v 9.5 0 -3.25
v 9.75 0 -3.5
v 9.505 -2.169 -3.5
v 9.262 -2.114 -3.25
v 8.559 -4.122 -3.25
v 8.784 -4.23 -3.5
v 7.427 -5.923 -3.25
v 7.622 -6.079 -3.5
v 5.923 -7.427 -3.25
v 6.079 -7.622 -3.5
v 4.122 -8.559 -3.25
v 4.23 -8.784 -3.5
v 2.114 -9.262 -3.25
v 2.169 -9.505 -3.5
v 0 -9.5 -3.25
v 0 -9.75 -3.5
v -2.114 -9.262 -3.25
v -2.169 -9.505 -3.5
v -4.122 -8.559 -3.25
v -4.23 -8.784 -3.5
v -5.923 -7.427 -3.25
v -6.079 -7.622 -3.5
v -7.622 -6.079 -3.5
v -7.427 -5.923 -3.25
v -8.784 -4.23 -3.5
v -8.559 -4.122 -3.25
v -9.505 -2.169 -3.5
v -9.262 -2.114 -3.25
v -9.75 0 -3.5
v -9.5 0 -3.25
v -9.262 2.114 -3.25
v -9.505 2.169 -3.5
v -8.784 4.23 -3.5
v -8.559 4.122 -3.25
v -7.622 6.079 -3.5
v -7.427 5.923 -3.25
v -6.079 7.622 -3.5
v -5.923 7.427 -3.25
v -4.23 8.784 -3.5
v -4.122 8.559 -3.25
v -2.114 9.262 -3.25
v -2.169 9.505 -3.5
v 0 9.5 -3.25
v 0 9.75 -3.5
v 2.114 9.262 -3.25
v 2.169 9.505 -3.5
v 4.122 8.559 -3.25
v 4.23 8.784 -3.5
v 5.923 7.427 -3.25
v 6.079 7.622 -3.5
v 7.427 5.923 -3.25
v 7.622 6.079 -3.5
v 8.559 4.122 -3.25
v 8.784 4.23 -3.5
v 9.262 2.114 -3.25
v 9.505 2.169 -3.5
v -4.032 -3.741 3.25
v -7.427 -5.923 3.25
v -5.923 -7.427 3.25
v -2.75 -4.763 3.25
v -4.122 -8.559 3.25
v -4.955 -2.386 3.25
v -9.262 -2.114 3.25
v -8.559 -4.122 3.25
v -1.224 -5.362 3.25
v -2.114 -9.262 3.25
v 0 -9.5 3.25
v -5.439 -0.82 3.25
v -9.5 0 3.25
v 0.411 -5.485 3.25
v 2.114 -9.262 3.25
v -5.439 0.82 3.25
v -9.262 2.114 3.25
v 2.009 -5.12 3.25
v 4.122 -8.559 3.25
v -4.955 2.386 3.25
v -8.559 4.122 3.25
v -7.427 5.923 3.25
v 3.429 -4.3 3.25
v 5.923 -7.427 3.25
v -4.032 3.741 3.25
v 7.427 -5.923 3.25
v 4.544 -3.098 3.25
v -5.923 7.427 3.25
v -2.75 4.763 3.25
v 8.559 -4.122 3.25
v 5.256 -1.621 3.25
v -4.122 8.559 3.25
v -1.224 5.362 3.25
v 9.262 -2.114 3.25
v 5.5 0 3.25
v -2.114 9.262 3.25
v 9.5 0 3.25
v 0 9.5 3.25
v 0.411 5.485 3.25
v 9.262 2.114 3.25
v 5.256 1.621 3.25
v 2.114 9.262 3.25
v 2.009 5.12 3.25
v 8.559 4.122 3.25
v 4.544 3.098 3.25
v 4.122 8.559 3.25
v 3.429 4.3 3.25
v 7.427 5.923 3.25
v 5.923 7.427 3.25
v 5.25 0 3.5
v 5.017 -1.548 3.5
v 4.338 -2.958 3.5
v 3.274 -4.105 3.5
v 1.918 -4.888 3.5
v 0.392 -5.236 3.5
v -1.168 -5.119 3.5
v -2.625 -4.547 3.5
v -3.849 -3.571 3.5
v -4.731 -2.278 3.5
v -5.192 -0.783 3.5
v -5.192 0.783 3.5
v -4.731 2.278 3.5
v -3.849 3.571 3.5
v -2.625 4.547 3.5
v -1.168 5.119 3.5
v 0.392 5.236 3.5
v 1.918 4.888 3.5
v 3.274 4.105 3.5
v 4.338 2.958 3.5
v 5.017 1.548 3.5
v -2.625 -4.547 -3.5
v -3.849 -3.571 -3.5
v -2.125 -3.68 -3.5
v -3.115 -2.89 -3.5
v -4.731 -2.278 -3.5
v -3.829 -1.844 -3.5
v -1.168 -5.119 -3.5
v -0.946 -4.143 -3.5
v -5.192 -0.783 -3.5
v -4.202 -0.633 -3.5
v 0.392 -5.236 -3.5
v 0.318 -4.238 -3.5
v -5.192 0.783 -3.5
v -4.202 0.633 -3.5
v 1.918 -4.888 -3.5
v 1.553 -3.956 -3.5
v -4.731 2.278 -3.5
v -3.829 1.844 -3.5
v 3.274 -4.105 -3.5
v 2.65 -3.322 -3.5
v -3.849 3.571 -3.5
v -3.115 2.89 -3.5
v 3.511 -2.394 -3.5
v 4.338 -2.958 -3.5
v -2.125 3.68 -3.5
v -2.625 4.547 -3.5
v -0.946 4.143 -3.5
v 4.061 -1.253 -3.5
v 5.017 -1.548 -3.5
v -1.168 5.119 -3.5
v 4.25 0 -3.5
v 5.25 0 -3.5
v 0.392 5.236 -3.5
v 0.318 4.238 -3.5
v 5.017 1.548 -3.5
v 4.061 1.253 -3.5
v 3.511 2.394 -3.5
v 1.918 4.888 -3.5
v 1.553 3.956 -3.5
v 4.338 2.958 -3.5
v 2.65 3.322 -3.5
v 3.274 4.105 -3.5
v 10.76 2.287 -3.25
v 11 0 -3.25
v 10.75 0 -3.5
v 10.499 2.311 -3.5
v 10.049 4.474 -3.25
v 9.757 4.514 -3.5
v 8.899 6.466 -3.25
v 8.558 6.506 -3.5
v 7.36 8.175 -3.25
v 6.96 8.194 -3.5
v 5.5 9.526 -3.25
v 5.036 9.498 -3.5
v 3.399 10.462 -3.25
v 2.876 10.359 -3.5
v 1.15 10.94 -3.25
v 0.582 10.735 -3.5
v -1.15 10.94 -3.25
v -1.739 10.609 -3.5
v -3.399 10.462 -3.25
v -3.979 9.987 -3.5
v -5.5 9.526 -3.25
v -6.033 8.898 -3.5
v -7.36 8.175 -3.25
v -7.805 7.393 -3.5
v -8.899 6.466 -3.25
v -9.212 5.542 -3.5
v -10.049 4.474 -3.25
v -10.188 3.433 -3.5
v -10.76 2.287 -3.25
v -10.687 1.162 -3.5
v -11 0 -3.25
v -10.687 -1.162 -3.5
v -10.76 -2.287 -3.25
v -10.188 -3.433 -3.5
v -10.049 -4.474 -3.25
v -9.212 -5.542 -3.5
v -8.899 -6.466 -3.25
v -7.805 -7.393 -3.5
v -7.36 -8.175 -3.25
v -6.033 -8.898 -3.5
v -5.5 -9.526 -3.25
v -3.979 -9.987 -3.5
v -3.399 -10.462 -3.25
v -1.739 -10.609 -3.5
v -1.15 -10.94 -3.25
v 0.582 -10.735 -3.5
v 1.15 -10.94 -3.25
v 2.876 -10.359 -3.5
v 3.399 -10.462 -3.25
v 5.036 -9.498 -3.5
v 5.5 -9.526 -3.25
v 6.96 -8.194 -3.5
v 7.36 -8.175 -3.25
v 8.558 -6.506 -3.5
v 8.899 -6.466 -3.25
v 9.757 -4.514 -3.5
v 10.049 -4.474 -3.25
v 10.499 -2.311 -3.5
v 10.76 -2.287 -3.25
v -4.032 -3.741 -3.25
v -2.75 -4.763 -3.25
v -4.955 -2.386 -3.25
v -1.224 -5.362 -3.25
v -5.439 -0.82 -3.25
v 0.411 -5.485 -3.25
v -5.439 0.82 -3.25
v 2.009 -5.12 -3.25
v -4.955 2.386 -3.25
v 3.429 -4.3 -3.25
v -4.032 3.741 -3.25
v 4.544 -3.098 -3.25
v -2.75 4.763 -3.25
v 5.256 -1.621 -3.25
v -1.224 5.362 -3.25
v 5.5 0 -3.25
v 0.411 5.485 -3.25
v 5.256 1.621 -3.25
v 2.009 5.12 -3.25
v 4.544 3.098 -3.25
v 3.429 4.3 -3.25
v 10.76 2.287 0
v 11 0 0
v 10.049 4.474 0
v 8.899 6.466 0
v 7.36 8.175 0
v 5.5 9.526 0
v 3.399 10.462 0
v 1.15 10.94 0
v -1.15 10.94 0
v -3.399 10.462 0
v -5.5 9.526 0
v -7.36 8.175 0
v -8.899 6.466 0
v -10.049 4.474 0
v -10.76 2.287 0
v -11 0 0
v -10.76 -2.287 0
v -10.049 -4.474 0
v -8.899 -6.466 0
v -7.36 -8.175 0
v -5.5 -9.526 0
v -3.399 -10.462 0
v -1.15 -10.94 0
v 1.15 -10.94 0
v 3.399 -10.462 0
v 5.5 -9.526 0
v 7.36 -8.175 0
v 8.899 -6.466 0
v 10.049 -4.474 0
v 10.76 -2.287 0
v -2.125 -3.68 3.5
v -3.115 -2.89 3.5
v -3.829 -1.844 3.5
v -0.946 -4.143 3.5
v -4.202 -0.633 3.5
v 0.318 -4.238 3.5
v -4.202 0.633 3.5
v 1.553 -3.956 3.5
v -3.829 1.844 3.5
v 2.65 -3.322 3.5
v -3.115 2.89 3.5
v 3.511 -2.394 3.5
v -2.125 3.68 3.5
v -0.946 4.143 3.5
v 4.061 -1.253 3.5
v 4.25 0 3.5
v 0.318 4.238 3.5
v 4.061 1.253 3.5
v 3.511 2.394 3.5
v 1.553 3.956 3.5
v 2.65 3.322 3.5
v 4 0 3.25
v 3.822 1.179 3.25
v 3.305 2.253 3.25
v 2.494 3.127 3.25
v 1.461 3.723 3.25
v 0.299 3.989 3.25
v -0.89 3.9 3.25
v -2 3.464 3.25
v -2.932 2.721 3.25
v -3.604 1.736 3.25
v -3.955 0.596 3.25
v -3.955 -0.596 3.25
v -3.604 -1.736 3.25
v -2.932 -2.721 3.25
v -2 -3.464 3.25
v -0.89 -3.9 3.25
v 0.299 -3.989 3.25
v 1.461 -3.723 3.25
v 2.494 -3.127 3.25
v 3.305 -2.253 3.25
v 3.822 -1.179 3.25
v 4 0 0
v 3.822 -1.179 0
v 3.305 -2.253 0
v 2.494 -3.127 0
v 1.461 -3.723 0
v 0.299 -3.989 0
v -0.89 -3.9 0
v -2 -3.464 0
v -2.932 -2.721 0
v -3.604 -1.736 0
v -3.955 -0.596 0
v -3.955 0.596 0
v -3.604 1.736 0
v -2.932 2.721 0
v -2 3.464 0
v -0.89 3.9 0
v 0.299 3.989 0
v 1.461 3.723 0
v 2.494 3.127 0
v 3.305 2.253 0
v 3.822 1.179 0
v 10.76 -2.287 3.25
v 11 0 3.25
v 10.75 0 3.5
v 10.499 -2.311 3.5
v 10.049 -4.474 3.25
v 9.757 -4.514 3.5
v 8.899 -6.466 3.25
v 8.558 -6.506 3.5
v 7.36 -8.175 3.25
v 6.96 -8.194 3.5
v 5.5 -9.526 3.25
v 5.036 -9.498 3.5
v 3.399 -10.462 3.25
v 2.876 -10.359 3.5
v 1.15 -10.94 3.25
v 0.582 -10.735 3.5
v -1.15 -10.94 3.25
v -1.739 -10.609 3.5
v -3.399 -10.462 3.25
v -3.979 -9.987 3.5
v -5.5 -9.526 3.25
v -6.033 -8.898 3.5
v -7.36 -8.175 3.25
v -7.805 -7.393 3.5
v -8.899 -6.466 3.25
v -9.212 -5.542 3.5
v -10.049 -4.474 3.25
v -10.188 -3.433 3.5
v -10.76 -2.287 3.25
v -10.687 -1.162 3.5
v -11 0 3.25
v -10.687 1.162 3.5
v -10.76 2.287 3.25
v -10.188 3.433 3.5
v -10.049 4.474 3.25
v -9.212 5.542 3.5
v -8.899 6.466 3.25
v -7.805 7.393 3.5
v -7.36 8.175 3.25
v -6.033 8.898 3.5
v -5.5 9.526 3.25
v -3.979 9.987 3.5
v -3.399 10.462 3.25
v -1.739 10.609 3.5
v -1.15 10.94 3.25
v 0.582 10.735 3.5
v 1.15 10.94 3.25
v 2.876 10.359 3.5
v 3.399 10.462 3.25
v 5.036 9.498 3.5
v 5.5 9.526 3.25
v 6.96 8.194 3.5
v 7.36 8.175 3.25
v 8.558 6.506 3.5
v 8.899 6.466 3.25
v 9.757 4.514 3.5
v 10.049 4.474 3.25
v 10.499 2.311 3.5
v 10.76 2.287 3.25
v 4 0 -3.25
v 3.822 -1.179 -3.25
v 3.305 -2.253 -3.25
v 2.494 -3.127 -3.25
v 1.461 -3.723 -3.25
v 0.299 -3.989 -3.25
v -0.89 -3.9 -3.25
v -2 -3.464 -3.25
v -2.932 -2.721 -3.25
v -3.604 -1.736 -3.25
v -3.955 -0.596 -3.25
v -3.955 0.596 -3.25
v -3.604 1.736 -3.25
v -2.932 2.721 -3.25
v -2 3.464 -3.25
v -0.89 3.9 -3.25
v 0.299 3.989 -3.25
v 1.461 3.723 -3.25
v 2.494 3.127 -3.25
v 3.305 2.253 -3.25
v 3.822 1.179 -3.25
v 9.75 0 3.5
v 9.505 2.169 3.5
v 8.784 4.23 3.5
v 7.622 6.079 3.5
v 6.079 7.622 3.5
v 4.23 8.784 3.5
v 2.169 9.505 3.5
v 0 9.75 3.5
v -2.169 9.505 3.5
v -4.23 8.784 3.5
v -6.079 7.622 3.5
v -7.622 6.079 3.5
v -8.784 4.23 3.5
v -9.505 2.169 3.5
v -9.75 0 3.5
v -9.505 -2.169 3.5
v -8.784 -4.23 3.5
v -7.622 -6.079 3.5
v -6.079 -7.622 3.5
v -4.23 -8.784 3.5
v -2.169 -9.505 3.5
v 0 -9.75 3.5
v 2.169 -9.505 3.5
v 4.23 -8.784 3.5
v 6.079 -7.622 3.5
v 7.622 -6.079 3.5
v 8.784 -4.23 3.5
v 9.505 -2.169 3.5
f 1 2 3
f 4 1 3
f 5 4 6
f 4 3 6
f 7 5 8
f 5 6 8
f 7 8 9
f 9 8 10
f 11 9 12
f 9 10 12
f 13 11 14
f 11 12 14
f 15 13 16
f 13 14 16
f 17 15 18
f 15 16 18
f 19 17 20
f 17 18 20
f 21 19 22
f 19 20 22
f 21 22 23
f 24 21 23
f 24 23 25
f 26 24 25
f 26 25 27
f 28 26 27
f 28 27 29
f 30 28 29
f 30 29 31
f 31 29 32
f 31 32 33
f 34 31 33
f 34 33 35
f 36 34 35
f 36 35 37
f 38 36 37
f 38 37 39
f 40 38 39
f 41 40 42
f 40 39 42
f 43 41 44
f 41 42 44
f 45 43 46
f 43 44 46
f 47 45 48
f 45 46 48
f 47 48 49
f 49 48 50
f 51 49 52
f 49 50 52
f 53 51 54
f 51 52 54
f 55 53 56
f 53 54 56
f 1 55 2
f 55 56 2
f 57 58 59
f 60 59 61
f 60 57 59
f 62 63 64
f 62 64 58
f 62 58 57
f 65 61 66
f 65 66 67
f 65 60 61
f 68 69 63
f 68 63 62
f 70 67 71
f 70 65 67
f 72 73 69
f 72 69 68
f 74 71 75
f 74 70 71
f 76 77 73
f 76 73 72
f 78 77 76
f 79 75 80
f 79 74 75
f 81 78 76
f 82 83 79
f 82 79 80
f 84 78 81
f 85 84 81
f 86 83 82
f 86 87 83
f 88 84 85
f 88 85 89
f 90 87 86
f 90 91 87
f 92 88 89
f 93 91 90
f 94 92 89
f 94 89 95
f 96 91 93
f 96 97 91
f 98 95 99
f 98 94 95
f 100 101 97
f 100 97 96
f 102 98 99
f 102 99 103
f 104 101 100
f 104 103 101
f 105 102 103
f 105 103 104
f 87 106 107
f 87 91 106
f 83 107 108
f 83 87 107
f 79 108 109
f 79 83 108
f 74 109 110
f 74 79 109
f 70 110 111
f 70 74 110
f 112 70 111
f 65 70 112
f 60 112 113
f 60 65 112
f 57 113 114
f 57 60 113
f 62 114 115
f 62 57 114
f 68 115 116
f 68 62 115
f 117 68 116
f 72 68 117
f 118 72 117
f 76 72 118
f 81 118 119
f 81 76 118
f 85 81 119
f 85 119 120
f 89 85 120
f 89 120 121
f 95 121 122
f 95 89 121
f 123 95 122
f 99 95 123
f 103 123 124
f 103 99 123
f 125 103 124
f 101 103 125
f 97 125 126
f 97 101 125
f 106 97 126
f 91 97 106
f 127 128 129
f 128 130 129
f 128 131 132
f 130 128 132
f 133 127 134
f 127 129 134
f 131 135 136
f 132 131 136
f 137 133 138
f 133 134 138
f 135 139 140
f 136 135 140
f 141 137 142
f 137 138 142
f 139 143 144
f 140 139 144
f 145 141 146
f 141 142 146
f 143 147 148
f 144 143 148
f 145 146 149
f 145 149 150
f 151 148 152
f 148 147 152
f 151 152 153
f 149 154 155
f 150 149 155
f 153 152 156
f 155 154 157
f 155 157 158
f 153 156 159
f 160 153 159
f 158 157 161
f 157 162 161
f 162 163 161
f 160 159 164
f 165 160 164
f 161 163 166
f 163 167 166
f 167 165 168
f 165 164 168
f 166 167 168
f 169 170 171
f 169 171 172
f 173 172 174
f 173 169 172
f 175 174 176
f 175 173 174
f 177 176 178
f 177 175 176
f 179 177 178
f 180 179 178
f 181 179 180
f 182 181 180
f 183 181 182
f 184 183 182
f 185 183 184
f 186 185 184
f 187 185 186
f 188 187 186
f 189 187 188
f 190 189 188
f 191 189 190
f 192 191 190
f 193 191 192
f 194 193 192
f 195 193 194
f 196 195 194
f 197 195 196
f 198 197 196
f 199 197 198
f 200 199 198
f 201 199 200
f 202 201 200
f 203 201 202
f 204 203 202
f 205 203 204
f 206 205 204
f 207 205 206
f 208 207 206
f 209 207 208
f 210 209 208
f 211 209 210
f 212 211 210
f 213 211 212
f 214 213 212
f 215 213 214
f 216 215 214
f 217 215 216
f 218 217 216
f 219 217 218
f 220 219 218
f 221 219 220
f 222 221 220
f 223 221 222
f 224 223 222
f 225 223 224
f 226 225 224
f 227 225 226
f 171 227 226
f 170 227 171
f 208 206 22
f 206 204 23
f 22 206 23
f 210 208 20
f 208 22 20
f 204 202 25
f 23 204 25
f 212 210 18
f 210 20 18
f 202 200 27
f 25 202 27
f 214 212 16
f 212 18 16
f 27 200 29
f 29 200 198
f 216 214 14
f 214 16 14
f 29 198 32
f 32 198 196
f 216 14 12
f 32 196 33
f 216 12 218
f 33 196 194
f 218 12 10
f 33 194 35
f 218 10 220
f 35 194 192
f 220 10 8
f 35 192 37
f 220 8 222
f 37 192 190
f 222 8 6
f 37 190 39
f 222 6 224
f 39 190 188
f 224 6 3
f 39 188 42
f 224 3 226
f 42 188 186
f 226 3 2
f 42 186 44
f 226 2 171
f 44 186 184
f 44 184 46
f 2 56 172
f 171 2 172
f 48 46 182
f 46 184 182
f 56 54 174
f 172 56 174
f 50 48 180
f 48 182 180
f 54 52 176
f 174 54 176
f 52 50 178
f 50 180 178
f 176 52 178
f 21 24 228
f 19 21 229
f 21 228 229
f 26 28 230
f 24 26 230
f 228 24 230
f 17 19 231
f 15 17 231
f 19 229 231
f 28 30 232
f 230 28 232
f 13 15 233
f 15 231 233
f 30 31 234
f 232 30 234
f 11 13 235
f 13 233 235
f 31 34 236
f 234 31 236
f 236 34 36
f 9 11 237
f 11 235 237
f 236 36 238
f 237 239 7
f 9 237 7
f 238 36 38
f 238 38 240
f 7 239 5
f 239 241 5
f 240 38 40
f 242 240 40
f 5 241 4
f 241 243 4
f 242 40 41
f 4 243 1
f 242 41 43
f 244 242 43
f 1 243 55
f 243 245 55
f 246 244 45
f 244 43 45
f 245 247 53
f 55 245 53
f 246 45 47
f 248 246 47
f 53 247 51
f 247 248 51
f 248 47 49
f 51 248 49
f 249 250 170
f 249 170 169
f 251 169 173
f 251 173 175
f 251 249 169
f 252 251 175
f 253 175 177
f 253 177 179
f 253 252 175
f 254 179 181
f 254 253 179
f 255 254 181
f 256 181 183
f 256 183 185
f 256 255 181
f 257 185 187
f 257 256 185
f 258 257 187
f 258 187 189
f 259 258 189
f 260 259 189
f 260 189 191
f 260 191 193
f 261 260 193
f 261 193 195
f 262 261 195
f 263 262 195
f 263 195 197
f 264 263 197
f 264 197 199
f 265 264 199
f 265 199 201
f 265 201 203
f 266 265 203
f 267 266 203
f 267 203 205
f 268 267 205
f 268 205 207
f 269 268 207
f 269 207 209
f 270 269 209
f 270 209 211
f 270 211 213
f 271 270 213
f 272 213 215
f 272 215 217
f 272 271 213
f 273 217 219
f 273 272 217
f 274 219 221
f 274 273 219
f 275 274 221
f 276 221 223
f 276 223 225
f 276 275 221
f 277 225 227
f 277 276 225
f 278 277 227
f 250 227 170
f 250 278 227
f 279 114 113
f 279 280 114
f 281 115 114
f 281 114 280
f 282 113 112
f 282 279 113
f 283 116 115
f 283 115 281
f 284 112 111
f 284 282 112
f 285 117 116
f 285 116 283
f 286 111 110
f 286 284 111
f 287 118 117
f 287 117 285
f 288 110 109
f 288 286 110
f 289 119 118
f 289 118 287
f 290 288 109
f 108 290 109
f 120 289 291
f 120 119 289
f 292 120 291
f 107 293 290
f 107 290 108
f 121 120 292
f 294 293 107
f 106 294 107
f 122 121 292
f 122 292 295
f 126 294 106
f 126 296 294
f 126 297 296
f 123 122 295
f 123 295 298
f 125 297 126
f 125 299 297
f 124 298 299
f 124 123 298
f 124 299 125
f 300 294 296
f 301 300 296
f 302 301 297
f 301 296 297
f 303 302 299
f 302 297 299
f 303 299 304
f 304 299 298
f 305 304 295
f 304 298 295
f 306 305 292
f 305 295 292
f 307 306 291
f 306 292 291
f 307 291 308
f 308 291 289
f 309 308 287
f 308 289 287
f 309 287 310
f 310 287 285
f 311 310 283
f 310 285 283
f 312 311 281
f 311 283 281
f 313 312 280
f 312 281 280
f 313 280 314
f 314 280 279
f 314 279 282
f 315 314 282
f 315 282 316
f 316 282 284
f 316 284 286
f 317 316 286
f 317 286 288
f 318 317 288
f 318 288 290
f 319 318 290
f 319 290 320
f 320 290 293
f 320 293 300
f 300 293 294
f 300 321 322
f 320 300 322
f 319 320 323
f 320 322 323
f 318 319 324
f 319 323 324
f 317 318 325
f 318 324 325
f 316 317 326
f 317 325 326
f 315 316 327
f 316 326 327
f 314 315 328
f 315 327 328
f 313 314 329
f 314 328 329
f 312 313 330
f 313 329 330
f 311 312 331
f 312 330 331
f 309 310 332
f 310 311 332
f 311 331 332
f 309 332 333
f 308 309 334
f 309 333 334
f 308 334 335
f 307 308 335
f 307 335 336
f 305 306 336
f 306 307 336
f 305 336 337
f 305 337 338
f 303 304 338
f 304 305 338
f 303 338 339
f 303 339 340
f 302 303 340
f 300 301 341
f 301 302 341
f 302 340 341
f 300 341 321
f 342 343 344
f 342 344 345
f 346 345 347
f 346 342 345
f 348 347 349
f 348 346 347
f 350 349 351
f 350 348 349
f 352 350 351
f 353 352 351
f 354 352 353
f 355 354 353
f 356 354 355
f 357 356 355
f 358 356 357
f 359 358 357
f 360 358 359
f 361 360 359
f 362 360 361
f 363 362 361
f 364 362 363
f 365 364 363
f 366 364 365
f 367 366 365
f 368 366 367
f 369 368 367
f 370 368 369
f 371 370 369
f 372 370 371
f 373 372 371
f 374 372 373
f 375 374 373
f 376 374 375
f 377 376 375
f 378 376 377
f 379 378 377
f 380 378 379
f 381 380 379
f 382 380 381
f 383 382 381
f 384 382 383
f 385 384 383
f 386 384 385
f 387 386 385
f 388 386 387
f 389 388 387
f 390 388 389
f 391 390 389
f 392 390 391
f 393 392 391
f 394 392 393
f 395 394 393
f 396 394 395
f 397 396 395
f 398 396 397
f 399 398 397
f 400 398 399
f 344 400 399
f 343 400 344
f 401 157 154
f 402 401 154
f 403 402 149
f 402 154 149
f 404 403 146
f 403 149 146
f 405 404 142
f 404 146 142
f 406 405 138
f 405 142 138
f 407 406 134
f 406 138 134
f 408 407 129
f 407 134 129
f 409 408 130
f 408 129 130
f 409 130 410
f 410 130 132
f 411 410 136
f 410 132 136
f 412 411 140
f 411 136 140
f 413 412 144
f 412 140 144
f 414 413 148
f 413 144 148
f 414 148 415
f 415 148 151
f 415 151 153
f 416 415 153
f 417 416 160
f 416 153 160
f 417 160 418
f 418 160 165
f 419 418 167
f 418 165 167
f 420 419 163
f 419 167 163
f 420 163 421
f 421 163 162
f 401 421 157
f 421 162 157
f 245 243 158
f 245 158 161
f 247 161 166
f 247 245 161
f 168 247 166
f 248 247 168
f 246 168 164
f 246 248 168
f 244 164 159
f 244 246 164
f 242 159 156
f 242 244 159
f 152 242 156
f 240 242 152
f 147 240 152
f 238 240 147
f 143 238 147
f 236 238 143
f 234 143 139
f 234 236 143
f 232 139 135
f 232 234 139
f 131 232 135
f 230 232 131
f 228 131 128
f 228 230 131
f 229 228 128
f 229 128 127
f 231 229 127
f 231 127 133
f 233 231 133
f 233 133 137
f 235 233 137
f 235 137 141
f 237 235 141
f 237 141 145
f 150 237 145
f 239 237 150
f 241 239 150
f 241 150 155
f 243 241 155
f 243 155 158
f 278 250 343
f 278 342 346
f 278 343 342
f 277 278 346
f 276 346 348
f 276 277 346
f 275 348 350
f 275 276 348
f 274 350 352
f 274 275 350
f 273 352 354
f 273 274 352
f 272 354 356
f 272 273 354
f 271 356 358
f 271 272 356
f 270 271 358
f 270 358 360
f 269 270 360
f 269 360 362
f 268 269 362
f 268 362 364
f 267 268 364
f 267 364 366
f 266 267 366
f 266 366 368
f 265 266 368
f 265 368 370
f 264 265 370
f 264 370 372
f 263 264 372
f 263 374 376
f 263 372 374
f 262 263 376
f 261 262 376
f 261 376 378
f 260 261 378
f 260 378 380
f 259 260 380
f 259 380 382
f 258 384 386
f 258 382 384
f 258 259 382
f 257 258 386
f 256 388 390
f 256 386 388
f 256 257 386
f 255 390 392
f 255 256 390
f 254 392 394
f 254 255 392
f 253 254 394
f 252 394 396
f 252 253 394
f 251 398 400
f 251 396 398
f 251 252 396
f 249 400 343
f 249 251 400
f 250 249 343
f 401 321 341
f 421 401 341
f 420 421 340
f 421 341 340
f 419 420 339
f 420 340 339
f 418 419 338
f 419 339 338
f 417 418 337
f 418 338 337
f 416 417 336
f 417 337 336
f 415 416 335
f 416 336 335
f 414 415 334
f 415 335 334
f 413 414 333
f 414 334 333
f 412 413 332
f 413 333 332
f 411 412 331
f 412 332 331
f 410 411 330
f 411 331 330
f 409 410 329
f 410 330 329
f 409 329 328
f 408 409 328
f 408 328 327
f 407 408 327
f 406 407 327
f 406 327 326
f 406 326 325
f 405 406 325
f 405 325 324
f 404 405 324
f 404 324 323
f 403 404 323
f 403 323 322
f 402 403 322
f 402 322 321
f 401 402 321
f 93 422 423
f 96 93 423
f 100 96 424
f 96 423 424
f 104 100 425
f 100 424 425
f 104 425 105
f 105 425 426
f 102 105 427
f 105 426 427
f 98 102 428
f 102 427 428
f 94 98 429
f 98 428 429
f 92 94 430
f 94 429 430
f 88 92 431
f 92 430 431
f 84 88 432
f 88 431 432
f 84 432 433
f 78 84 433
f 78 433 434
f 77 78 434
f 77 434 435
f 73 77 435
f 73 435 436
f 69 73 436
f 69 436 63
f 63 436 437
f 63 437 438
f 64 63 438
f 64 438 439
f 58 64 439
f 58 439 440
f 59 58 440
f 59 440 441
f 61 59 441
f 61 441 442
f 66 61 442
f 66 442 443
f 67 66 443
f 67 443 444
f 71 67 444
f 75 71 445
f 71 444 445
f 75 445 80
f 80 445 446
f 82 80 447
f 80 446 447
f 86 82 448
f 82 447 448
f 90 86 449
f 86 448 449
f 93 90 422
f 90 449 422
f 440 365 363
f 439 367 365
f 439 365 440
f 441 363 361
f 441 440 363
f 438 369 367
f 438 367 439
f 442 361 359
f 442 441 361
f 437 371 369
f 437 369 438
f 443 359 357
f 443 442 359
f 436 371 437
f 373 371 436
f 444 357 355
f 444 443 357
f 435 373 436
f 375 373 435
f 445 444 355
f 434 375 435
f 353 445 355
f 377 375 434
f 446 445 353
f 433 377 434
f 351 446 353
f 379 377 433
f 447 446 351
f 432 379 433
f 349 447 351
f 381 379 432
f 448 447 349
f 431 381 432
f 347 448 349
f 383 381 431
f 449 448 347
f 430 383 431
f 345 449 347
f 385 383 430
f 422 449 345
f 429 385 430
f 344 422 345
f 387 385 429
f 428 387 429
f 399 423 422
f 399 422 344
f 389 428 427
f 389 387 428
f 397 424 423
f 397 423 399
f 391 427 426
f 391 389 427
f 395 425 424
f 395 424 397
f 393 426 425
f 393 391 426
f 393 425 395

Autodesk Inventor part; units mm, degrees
ref_plane "YZ Plane" through (0, 0, 0) normal (1, 0, 0) x (0, 1, 0)
ref_plane "XZ Plane" through (0, 0, 0) normal (0, 1, 0) x (-1, 0, 0)
ref_plane "XY Plane" through (0, 0, 0) normal (0, 0, 1) x (1, 0, 0)
sketch "Sketch1" plane through (0, 0, 0) normal (0, 0, 1) x (1, 0, 0)
  circle A0 centre (0, 0) radius 11
  circle A1 centre (0, 0) radius 4
  circle A2 centre (0, 0) radius 9.5
  circle A3 centre (0, 0) radius 5.5
  dimension "d0" = 22
  dimension "d1" = 8
  dimension "d2" = 1.5
  dimension "d3" = 1.5
extrude "Extrusion1" add sketch "Sketch1" along normal mid plane 7
extrude "Extrusion2" add sketch "Sketch1" along normal mid plane 6.5 contours A2
chamfer "Chamfer1" distance 0.25 angle 45 8 edges at (-9.5, 0, 3.5) (-11, 0, 3.5) (-4, 0, -3.5) (-5.5, 0, -3.5) (-9.5, 0, -3.5) (-11, 0, -3.5) (-5.5, 0, 3.5) (-4, 0, 3.5)
properties part number "608-2RS Bearing" material "Steel, Carbon"
